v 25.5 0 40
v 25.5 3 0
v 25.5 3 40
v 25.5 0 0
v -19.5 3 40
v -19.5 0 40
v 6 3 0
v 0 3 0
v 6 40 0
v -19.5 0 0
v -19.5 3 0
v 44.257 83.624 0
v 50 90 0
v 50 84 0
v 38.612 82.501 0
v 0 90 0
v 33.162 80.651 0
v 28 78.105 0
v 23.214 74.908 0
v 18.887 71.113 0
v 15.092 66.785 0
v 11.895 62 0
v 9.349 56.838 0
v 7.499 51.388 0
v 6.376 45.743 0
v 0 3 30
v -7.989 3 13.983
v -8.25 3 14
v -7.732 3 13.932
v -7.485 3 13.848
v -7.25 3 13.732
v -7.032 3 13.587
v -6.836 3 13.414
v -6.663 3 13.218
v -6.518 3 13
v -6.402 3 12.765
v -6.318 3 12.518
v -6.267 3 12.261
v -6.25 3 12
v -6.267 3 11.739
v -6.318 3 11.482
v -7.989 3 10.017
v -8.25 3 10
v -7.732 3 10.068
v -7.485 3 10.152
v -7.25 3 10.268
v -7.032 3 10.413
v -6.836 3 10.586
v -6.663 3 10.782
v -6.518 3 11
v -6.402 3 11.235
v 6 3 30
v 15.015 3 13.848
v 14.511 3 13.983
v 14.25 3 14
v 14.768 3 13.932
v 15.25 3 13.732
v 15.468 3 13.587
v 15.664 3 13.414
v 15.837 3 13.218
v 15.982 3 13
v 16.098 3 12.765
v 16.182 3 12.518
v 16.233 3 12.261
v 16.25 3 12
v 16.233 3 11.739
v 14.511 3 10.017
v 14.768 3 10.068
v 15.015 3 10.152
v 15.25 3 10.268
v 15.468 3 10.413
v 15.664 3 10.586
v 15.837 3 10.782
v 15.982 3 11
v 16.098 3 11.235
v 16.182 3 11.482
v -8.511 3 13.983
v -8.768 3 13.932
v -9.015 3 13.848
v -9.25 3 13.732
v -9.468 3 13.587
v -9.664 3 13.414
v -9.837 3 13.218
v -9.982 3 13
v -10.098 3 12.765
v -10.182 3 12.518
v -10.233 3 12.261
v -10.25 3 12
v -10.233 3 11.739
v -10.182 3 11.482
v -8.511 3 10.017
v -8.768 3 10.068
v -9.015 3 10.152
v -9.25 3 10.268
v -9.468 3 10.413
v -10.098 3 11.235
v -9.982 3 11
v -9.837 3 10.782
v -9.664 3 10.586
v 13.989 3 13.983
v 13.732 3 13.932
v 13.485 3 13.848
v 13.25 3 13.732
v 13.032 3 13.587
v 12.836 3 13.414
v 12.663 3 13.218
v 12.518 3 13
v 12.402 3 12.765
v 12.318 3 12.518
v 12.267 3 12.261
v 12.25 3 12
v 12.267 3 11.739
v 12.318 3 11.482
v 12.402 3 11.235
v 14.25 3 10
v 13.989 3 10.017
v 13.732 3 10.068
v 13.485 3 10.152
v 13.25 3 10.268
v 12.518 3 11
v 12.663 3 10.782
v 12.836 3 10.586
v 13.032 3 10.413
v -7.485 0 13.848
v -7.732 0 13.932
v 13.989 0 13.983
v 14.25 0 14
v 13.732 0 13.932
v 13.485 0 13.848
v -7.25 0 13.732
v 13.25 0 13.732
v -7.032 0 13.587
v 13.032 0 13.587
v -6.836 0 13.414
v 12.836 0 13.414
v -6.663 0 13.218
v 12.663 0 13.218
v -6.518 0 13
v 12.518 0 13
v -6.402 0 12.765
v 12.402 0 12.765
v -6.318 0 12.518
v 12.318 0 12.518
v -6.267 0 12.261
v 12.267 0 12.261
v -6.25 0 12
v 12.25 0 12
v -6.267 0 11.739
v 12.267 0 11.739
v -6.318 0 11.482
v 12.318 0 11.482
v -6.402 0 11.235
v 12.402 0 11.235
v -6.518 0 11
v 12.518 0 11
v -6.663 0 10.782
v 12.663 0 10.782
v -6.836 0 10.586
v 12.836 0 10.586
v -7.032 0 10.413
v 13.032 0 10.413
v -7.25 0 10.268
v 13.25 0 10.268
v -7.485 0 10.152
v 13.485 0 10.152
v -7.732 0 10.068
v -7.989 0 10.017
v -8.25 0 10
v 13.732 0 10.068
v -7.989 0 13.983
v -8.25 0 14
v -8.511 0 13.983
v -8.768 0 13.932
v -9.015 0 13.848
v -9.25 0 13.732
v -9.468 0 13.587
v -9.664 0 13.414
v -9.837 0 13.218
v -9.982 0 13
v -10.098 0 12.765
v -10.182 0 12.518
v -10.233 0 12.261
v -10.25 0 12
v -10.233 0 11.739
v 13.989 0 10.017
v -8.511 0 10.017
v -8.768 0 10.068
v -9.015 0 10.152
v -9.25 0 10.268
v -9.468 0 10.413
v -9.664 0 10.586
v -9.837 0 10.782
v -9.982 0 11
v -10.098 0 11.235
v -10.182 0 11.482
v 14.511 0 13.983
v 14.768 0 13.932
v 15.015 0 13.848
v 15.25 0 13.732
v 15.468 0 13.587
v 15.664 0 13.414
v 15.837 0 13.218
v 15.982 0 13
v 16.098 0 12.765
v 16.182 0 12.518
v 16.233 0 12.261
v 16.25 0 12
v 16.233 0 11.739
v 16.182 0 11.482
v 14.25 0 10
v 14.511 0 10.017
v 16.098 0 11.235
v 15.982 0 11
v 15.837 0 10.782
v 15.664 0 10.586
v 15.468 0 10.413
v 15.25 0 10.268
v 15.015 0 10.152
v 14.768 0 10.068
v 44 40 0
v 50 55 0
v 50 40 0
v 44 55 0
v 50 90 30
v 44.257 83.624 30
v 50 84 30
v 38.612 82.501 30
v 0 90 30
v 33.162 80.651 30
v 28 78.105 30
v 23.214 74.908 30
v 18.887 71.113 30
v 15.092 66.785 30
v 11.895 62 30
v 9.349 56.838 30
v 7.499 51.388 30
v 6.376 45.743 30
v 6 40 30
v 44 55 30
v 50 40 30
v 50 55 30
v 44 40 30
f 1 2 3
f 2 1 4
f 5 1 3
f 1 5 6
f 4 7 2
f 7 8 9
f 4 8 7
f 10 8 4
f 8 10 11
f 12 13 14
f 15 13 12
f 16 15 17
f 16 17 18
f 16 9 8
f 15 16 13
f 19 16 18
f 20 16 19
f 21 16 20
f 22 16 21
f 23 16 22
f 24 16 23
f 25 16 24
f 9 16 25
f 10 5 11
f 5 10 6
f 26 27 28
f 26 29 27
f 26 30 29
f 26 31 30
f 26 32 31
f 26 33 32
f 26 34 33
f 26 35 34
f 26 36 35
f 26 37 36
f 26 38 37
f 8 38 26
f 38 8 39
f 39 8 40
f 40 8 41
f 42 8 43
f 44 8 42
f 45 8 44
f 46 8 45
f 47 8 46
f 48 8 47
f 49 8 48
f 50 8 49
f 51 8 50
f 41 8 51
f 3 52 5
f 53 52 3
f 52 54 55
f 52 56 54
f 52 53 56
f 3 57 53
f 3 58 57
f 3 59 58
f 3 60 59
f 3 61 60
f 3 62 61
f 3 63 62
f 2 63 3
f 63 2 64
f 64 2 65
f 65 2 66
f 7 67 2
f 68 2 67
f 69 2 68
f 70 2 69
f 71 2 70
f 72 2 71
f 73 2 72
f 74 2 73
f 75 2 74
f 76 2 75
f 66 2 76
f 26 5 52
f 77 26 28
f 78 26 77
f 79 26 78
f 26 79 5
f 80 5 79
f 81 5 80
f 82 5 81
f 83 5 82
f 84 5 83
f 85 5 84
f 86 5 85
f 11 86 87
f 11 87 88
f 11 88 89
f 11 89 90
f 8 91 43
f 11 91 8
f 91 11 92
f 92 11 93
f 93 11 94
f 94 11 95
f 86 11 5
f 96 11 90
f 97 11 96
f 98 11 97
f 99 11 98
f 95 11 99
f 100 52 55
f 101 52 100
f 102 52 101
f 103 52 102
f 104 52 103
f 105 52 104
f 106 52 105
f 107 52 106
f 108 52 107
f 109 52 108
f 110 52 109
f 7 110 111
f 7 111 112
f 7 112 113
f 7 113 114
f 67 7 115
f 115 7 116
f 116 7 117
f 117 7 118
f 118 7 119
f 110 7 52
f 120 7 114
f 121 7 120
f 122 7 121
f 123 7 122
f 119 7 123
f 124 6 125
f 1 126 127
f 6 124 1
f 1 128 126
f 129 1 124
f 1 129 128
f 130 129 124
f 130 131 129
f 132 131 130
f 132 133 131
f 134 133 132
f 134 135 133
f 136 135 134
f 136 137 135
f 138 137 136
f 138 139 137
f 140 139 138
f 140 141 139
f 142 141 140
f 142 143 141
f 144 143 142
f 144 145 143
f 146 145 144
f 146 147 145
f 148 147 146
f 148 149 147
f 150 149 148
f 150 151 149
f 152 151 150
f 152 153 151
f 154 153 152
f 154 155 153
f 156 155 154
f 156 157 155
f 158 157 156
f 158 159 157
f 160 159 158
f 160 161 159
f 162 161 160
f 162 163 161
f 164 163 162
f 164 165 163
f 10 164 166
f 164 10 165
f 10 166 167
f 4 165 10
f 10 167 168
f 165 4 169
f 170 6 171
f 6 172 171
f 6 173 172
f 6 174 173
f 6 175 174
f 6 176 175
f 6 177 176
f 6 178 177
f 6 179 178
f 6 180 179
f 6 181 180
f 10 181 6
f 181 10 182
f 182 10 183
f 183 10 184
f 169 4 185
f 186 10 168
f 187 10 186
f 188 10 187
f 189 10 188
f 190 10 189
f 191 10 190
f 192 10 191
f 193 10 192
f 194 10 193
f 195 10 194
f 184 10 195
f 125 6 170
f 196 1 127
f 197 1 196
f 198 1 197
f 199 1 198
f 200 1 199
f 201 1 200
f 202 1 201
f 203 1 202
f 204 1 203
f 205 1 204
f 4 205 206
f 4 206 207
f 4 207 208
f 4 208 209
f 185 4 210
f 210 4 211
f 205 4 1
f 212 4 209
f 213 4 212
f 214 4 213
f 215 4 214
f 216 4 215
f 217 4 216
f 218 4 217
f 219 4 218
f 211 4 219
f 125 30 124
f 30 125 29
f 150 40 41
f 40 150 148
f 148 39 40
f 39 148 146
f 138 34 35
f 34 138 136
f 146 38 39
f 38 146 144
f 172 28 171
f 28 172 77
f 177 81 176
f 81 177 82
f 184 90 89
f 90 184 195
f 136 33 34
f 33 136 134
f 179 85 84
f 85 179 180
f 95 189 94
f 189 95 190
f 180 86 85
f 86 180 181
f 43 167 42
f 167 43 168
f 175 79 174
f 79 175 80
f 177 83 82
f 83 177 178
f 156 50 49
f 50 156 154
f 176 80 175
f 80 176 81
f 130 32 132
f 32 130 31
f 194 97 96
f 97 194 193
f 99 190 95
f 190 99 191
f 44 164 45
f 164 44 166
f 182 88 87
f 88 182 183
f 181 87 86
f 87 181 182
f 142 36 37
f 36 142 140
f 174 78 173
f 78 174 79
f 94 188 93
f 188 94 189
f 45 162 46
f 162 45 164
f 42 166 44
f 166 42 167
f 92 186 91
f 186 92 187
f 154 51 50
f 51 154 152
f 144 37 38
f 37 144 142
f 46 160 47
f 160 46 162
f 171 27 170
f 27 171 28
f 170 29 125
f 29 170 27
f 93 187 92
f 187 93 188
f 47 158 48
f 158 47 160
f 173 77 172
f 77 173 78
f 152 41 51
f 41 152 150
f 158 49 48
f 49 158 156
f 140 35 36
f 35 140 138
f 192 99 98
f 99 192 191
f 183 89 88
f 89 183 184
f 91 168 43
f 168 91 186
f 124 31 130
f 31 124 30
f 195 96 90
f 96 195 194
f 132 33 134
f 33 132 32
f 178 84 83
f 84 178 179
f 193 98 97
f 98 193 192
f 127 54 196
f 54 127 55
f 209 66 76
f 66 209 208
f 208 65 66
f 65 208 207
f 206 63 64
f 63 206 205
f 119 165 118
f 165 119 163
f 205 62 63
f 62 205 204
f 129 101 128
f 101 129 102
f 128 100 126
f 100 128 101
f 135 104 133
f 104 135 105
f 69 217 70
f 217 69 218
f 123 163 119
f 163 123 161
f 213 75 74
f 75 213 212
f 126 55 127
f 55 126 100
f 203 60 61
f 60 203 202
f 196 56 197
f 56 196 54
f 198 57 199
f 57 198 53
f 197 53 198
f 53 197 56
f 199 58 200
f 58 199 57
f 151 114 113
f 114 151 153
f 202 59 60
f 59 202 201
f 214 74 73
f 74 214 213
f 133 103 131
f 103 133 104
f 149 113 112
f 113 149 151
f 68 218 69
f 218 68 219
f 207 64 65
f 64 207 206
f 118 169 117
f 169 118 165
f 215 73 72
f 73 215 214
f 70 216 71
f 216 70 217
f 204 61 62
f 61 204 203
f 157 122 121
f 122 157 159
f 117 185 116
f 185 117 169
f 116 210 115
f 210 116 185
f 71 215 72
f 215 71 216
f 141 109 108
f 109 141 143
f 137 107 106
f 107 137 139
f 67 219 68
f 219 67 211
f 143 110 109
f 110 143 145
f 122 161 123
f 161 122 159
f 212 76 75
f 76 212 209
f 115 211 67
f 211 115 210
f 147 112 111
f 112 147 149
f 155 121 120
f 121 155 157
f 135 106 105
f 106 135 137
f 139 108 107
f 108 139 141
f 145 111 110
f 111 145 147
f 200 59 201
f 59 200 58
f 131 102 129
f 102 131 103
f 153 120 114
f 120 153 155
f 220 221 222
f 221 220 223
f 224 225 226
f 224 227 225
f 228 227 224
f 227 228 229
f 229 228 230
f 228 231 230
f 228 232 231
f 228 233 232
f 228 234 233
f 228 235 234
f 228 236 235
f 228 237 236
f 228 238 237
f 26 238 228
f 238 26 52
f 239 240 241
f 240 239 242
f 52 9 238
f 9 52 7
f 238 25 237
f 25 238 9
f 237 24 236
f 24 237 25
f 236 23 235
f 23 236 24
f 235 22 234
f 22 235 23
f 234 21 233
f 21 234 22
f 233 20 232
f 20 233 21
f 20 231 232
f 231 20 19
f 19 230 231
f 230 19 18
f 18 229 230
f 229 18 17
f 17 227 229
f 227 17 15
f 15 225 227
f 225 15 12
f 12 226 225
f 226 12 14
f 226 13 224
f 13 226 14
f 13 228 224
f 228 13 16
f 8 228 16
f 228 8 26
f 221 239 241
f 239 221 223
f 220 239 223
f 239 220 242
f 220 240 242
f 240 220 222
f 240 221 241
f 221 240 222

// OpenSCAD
// Parametric Hook Template
// Wall hook for hanging items

$fn = 48;

// Parameters
width = 30;        // mm
hook_depth = 50;   // mm
height = 80;       // mm
thickness = 6;     // mm

// Mounting plate dimensions
plate_width = width * 1.5;
plate_height = height * 0.5;

// Basic hook profile
module hook_profile() {
    // Mounting section (straight up)
    square([thickness, plate_height]);
    
    // Curve outward
    translate([0, plate_height])
        difference() {
            square([hook_depth, hook_depth]);
            translate([hook_depth, 0])
                circle(r=hook_depth - thickness);
        }
    
    // Hook tip (curved up)
    translate([hook_depth - thickness, plate_height])
        square([thickness, hook_depth * 0.3]);
}

// Main hook
module hook() {
    // Mounting plate with holes
    difference() {
        translate([-plate_width/2 + thickness/2, 0, 0])
            cube([plate_width, thickness/2, plate_height]);
        
        // Screw holes
        translate([-plate_width/4 + thickness/2, -1, plate_height * 0.3])
            rotate([-90, 0, 0])
                cylinder(h=thickness, d=4);
        translate([plate_width/4 + thickness/2, -1, plate_height * 0.3])
            rotate([-90, 0, 0])
                cylinder(h=thickness, d=4);
    }
    
    // Hook arm
    linear_extrude(width)
        hook_profile();
}

hook();
